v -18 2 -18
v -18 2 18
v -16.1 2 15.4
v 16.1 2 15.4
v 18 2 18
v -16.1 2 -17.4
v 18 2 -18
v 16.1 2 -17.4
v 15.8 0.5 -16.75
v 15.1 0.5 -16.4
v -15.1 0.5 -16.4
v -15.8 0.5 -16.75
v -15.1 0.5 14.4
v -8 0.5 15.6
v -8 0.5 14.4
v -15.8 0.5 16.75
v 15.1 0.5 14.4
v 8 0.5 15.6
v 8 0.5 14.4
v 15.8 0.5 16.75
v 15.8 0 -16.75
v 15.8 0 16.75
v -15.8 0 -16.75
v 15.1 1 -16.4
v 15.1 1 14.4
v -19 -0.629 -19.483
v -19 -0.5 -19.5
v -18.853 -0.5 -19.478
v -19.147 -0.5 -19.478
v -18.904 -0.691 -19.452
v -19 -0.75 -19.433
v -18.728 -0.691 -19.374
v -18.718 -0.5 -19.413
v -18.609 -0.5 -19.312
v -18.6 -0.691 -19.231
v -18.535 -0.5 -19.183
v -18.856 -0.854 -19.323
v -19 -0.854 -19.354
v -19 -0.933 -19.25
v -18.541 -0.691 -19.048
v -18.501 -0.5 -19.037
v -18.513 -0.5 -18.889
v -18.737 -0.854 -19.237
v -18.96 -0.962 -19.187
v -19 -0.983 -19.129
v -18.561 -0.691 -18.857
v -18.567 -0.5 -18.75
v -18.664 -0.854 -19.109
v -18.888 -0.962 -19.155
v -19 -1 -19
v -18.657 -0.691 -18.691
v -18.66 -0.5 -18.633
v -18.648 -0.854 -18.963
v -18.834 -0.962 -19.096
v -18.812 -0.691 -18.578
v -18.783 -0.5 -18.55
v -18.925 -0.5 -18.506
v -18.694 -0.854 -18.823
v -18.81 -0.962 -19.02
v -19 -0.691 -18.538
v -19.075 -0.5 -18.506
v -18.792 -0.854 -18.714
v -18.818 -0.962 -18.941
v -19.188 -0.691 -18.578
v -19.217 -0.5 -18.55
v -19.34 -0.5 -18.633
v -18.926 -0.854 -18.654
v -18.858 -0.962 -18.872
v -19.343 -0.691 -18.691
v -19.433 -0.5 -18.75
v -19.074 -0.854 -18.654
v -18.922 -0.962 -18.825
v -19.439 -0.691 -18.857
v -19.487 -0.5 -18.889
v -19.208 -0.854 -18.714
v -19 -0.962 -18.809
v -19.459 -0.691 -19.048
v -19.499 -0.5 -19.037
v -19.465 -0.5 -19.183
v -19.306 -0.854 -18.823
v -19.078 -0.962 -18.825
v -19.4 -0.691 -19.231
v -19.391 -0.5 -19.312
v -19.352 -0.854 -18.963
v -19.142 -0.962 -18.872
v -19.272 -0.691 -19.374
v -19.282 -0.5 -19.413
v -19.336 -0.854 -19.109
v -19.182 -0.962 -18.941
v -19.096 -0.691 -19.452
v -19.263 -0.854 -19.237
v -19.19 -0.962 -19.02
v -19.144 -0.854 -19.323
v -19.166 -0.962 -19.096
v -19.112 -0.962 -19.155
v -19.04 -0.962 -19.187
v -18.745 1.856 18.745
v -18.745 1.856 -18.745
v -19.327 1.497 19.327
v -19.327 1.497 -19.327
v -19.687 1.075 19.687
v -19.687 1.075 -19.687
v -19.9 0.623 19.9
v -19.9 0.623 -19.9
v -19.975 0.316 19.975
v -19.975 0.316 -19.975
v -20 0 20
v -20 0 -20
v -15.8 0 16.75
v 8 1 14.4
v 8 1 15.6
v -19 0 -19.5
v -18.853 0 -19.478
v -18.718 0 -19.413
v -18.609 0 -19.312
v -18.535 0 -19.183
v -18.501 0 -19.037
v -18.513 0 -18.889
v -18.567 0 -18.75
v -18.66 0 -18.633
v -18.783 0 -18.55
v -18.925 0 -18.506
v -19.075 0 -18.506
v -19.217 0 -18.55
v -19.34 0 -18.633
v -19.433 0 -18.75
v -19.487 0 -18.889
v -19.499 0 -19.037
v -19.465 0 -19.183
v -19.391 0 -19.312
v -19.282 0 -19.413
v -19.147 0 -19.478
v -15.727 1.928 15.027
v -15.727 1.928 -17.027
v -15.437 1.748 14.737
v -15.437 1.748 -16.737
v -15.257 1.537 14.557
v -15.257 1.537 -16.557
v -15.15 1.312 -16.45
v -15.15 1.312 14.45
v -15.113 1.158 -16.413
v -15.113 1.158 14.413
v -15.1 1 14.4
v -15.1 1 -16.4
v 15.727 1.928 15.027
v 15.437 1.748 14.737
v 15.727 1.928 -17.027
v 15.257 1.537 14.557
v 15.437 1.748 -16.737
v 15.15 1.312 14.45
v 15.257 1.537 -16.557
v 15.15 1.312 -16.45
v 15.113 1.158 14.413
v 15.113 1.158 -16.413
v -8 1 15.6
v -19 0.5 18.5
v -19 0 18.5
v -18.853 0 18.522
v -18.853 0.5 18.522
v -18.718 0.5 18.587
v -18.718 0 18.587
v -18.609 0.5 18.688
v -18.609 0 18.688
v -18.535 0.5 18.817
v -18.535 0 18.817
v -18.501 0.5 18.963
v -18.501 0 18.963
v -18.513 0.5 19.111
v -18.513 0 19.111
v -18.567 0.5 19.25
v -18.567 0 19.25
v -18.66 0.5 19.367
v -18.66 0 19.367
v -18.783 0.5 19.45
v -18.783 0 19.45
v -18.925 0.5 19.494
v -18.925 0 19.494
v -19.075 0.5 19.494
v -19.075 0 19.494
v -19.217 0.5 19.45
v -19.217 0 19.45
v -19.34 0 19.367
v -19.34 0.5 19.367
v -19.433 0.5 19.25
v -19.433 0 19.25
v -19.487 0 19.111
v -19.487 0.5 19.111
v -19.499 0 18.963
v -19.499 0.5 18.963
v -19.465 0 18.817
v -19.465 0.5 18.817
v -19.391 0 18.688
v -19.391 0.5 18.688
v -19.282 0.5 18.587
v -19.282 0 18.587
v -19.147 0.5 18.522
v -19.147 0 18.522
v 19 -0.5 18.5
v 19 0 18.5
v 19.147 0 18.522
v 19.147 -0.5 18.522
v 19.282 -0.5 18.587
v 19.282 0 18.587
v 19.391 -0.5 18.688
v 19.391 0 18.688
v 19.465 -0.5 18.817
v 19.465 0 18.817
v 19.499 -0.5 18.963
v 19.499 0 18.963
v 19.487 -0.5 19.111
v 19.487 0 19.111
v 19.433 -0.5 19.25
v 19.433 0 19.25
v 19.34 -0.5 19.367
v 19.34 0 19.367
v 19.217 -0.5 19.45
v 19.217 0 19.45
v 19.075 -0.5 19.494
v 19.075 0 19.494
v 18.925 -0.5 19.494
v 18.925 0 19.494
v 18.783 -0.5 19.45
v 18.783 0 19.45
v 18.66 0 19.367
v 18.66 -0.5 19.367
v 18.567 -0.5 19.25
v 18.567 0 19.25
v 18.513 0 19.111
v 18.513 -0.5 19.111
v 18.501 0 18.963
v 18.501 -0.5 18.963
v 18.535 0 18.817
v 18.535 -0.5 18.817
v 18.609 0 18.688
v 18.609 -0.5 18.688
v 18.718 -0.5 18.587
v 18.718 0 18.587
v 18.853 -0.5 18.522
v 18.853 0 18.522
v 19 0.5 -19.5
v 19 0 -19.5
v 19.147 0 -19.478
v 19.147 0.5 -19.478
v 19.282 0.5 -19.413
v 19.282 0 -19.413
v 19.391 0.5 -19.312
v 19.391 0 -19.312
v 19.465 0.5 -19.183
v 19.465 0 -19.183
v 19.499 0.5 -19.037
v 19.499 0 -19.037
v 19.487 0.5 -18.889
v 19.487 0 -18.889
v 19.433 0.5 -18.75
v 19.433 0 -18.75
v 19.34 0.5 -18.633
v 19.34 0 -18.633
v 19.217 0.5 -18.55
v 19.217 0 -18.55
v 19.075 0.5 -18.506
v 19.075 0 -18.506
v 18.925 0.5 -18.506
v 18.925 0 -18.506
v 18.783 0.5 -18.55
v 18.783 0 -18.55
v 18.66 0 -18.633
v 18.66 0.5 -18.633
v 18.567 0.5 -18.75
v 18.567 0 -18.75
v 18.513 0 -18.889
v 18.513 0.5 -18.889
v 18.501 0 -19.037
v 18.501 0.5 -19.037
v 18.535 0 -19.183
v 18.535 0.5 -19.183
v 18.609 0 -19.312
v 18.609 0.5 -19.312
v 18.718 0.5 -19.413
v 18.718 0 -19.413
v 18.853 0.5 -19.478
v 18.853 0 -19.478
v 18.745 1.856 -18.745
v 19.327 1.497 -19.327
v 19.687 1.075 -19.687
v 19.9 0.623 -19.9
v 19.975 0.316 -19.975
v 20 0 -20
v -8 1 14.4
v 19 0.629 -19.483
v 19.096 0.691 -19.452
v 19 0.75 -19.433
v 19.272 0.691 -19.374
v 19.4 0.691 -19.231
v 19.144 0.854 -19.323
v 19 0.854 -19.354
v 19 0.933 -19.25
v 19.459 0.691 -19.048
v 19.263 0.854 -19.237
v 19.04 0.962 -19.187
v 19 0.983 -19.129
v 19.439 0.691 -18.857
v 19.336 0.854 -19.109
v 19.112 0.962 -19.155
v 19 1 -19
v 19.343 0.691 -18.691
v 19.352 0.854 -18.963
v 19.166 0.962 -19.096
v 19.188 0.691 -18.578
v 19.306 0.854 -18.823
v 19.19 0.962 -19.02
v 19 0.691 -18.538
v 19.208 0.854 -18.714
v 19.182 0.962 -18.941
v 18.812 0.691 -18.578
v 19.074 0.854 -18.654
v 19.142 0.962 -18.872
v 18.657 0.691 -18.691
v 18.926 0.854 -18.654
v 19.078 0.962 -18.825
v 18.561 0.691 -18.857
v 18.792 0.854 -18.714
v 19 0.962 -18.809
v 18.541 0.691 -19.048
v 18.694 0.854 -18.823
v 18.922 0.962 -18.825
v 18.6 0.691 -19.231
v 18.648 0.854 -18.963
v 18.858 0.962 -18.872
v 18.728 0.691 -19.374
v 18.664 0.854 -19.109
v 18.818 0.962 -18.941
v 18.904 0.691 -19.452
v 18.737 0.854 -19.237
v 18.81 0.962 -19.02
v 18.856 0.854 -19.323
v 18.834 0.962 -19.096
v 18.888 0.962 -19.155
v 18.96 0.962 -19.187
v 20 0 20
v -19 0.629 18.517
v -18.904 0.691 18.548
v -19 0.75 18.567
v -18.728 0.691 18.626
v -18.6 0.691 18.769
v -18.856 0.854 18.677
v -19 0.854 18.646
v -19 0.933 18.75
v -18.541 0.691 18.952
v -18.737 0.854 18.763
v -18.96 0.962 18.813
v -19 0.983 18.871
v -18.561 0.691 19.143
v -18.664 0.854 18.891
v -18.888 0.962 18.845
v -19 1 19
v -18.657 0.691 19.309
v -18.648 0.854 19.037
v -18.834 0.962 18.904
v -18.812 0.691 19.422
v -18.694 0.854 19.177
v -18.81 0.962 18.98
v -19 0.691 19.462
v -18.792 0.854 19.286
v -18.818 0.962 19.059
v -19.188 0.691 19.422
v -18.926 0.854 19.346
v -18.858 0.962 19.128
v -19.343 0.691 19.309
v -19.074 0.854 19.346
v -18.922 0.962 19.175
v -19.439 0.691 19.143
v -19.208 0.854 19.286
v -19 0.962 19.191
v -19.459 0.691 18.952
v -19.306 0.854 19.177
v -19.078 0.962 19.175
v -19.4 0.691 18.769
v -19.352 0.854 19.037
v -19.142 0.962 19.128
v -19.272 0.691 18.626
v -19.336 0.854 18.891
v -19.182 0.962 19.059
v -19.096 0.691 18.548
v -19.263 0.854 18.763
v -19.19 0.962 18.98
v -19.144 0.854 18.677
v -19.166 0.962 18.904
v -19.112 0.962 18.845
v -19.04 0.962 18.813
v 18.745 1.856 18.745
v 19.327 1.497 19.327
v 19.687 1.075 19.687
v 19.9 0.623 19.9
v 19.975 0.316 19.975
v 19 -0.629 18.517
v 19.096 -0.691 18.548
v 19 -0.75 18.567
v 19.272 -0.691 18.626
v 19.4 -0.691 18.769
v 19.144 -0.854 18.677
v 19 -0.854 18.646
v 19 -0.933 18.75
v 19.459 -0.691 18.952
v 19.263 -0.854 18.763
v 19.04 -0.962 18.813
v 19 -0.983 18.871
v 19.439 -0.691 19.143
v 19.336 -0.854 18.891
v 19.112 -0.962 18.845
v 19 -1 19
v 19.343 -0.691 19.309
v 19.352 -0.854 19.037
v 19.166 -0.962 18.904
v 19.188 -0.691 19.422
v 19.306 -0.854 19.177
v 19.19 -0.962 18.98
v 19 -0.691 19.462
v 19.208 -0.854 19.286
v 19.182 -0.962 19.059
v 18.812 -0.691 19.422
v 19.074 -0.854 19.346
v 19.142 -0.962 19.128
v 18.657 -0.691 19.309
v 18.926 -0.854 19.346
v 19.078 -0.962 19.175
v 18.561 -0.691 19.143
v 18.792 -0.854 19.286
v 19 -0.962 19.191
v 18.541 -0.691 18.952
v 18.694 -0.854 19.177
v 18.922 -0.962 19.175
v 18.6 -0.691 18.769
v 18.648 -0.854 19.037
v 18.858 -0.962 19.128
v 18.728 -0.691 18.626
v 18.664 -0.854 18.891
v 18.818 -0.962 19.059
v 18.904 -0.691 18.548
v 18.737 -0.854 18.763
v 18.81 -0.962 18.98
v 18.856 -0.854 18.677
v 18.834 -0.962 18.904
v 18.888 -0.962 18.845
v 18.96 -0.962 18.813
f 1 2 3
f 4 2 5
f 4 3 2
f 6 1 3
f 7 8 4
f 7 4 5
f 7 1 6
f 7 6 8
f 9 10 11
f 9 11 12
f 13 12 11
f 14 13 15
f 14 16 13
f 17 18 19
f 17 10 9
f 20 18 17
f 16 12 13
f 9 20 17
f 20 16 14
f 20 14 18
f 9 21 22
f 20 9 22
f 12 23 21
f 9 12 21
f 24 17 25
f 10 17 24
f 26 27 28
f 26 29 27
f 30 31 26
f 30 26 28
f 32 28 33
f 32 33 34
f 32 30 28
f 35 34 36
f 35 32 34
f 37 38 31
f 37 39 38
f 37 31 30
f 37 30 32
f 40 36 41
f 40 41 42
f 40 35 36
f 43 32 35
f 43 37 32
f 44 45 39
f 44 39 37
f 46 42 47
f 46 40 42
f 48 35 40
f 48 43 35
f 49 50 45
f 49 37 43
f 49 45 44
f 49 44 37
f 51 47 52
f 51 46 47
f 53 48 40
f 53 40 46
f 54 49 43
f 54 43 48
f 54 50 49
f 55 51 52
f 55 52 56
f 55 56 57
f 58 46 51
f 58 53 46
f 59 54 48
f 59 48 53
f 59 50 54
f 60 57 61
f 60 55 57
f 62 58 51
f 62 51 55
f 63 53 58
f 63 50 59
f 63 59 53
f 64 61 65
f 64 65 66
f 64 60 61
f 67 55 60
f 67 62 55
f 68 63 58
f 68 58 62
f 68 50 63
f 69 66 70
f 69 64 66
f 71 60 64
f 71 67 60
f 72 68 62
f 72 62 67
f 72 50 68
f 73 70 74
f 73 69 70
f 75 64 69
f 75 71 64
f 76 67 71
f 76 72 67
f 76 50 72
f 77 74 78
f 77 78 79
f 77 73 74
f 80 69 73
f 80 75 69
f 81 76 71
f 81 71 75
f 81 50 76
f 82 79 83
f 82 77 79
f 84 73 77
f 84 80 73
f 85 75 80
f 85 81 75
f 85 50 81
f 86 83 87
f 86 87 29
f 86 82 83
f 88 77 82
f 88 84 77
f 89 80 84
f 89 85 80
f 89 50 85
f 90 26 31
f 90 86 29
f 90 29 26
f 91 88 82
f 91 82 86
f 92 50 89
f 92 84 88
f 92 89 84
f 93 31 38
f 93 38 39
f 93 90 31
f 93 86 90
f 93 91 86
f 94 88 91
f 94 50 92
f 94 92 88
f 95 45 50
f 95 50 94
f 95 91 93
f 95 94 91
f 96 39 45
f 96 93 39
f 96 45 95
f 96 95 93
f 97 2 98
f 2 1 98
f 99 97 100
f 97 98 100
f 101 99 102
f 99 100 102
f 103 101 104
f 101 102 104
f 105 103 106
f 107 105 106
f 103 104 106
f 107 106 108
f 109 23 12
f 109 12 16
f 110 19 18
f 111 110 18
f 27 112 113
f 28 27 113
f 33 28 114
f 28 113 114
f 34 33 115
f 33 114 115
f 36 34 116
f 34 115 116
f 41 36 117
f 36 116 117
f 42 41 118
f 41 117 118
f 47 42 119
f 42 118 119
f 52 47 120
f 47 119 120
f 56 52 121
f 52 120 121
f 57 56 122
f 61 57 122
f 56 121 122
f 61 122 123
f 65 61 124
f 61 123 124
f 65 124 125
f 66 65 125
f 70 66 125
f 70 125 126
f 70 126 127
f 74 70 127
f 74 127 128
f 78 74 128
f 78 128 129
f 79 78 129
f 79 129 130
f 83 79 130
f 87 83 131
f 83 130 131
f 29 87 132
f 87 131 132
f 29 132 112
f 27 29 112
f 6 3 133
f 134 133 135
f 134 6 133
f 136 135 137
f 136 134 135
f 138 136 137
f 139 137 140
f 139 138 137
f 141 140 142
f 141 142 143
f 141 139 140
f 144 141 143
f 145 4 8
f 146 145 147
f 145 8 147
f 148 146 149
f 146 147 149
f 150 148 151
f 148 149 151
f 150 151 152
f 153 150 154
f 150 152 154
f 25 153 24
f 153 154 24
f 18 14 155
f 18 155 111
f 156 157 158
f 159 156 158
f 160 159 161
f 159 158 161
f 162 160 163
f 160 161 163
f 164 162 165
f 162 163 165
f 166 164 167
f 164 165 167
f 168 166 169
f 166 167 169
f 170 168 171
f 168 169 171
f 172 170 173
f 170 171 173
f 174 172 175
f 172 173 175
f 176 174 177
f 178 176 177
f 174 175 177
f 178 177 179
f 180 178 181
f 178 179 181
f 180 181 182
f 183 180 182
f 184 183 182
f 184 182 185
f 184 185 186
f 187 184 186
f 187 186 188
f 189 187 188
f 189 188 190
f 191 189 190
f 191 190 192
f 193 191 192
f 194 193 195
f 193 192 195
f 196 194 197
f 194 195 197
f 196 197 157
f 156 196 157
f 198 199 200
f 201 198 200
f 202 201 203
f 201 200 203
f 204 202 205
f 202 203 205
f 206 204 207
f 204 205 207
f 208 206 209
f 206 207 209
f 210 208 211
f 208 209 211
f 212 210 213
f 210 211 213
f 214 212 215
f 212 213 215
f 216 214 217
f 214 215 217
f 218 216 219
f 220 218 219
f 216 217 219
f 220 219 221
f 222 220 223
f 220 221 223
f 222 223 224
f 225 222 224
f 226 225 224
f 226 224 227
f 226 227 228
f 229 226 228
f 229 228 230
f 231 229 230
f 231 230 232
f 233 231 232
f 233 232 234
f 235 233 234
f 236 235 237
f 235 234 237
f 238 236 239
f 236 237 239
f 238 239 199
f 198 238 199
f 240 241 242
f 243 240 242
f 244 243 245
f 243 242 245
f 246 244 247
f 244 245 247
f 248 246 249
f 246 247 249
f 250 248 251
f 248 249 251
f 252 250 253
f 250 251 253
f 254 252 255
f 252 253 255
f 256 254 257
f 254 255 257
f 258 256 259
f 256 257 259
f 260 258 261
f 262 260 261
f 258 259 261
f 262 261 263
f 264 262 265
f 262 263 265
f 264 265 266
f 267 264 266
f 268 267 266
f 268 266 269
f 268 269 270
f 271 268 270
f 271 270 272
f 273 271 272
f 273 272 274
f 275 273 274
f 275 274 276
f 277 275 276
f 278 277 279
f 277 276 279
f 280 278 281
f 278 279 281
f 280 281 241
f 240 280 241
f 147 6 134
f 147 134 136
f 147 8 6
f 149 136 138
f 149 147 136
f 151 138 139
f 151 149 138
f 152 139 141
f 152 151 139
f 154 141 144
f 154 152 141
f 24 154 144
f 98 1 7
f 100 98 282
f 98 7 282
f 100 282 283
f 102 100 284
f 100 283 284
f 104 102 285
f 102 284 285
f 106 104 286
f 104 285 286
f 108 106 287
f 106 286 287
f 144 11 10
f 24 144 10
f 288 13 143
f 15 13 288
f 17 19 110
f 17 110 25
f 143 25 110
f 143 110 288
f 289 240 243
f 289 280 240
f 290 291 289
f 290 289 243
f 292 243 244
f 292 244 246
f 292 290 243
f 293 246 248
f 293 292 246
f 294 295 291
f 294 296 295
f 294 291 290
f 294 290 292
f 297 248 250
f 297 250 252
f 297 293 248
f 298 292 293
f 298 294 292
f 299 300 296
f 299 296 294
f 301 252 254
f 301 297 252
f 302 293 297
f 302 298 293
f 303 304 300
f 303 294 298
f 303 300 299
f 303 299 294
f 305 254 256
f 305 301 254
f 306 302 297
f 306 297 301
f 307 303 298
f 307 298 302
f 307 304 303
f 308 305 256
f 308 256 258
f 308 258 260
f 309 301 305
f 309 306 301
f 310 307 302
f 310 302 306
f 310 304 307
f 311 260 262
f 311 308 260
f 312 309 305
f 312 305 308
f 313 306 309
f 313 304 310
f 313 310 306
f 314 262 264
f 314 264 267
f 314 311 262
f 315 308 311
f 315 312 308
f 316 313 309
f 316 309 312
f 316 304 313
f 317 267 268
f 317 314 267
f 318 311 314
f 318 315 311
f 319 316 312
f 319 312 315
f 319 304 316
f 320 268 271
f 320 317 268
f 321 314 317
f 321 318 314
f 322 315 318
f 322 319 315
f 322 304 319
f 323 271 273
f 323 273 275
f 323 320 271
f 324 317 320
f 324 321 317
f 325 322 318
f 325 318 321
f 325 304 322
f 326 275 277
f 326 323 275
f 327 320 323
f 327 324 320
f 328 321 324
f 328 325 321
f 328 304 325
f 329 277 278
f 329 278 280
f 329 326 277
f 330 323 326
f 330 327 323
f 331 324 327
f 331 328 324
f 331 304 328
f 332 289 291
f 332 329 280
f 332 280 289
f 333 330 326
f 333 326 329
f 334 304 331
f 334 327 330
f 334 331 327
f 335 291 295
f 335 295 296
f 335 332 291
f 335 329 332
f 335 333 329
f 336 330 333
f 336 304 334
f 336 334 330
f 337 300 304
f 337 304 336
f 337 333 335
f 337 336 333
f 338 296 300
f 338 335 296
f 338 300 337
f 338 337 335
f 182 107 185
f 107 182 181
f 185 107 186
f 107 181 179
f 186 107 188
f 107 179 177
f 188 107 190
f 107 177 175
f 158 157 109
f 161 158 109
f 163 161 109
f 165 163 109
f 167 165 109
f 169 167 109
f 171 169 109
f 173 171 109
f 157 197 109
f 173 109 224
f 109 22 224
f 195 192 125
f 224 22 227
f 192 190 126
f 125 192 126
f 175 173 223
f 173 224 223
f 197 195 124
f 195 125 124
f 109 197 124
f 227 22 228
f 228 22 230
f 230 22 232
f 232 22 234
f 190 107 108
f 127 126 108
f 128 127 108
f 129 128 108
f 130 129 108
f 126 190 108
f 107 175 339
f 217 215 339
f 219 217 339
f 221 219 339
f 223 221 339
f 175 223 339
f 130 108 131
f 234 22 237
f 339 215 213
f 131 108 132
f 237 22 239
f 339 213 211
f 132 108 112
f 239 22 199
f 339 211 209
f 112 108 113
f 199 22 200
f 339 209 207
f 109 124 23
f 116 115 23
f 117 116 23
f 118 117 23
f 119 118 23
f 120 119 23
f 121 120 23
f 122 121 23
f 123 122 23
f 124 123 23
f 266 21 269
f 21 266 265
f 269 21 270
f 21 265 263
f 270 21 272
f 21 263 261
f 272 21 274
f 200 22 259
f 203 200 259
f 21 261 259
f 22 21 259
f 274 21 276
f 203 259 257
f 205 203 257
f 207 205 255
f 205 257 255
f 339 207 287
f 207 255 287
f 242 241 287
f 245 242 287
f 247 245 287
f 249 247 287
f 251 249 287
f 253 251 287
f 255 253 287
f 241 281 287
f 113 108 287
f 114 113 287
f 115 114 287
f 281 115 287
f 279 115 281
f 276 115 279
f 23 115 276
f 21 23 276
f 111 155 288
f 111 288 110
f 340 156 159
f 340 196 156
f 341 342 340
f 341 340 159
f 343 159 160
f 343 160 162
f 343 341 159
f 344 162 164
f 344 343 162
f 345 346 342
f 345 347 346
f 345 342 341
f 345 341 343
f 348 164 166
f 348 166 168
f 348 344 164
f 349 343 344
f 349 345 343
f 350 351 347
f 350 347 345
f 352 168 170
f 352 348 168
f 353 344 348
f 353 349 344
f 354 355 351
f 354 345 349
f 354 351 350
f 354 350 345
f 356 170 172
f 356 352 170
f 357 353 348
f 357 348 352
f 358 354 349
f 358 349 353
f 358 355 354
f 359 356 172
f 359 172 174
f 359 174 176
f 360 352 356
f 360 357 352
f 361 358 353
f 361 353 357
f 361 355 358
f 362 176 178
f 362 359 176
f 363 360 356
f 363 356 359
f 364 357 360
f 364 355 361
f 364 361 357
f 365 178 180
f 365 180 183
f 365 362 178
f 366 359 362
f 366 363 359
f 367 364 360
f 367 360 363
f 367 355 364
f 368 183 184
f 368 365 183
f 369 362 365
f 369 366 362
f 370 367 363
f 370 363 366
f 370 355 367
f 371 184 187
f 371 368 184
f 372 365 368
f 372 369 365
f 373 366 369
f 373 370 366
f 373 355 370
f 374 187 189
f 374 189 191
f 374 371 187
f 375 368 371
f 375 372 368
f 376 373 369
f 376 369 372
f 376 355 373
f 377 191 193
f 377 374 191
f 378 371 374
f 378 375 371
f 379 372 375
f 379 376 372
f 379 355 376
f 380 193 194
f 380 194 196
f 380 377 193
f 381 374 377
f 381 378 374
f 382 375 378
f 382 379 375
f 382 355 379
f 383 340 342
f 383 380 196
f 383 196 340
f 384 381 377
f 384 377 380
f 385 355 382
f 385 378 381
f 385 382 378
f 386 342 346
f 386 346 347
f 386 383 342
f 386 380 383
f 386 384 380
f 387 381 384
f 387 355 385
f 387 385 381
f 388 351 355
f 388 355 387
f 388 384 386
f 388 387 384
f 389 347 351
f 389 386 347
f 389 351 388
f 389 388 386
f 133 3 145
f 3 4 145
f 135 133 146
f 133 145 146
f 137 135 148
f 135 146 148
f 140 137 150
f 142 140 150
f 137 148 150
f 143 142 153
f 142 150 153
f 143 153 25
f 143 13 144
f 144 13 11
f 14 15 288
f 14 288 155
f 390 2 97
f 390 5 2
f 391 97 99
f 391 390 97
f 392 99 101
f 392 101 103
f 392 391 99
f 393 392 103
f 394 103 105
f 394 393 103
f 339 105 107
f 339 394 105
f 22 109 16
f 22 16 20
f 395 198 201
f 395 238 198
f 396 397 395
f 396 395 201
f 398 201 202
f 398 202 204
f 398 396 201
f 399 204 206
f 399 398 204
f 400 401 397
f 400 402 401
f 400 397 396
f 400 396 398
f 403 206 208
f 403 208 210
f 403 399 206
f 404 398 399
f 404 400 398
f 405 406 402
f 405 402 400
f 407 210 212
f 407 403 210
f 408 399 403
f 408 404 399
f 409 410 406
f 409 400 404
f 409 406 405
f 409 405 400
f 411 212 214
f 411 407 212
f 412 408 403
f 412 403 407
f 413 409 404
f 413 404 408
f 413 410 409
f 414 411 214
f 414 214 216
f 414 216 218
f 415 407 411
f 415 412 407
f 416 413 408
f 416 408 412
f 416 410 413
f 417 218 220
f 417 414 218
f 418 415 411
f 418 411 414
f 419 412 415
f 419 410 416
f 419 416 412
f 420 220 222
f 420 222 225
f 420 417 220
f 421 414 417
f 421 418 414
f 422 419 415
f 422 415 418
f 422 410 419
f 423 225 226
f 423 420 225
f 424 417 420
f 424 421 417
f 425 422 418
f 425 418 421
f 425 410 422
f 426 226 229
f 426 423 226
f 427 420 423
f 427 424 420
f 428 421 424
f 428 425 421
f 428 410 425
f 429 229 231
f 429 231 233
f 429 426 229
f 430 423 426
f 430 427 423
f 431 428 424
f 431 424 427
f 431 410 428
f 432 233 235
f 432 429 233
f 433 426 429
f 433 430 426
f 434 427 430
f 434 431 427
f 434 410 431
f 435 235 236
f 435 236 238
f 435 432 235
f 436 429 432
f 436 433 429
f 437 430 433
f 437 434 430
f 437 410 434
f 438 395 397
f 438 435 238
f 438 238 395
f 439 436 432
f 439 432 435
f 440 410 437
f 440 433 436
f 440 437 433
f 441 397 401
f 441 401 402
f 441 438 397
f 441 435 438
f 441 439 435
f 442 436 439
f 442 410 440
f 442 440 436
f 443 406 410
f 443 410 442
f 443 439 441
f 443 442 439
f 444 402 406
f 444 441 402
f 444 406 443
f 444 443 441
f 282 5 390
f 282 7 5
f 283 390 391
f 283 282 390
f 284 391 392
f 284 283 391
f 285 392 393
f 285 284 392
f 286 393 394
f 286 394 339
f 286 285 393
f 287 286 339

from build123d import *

# Parameters (mm, degrees)
SKETCH_1_W          = 40
SKETCH_1_H          = 40
SKETCH_1_W_2        = 30.2
SKETCH_1_H_2        = 30.8
EXTRUDE_1_DEPTH     = 2
SKETCH_2_W          = 31.6
SKETCH_2_H          = 33.5
CUT_EXTRUDE_1_DEPTH = 0.5
SKETCH_3_W          = 16
SKETCH_3_H          = 1.2
CUT_EXTRUDE_2_DEPTH = 0.5
FILLET_1_R          = 1
FILLET_2_R          = 2
SKETCH_4_R          = 0.5
EXTRUDE_2_DEPTH     = 1
FILLET_4_R          = 0.5
SKETCH_5_R          = 0.5
CUT_EXTRUDE_3_DEPTH = 1
FILLET_5_R          = 0.5
FILLET_6_R          = 0.5


with BuildPart() as part:
    # 草图1 → 凸台-拉伸1 (new body)
    with BuildSketch(Plane(origin=(0, 0, 0), x_dir=(1, 0, 0), z_dir=(0, 1, 0))):
        Rectangle(SKETCH_1_W, SKETCH_1_H)
        with Locations((0, 1)):
            Rectangle(SKETCH_1_W_2, SKETCH_1_H_2, mode=Mode.SUBTRACT)
    extrude(amount=EXTRUDE_1_DEPTH)

    # 草图2 → 切除-拉伸1 (cut)
    with BuildSketch(Plane.XZ):
        Rectangle(SKETCH_2_W, SKETCH_2_H)
    extrude(amount=-CUT_EXTRUDE_1_DEPTH, mode=Mode.SUBTRACT)

    # 草图3 → 切除-拉伸2 (cut)
    with BuildSketch(Plane.XZ.offset(-0.5)):
        with Locations((0, 15)):
            Rectangle(SKETCH_3_W, SKETCH_3_H)
    extrude(amount=-CUT_EXTRUDE_2_DEPTH, mode=Mode.SUBTRACT)

    # 圆角1
    fillet_1_edges = [part.edges().sort_by_distance(p)[0] for p in [
        (15.1, 2, -1),
        (0, 2, -16.4),
        (-15.1, 2, -1),
        (0, 2, 14.4),
    ]]
    fillet(fillet_1_edges, radius=FILLET_1_R - 0.0001)  # a hair under: the kernel refuses the full size

    # 圆角2
    fillet_2_edges = [part.edges().sort_by_distance(p)[0] for p in [
        (0, 2, -20),
        (20, 2, 0),
        (0, 2, 20),
        (-20, 2, 0),
    ]]
    fillet(fillet_2_edges, radius=FILLET_2_R - 0.0001)  # a hair under: the kernel refuses the full size

    # 草图4 → 凸台-拉伸2 (add)
    with BuildSketch(Plane.XZ):
        with Locations(Location((-19, -19, 0), (0, 0, 270))):
            Circle(SKETCH_4_R)
        with Locations(Location((19, 19, 0), (0, 0, 270))):
            Circle(SKETCH_4_R)
    extrude(amount=EXTRUDE_2_DEPTH)

    # 圆角4
    fillet_4_edges = [part.edges().sort_by_distance(p)[0] for p in [
        (19, -1, 19.5),
    ]]
    fillet(fillet_4_edges, radius=FILLET_4_R)

    # 草图5 → 切除-拉伸3 (cut)
    with BuildSketch(Plane.XZ):
        with Locations(Location((19, -19, 0), (0, 0, 270))):
            Circle(SKETCH_5_R)
        with Locations(Location((-19, 19, 0), (0, 0, 270))):
            Circle(SKETCH_5_R)
    extrude(amount=-CUT_EXTRUDE_3_DEPTH, mode=Mode.SUBTRACT)

    # 圆角5
    fillet_5_edges = [part.edges().sort_by_distance(p)[0] for p in [
        (19, 1, -18.5),
        (-19, 1, 19.5),
    ]]
    fillet(fillet_5_edges, radius=FILLET_5_R)

    # 圆角6
    fillet_6_edges = [part.edges().sort_by_distance(p)[0] for p in [
        (-19, -1, -18.5),
    ]]
    fillet(fillet_6_edges, radius=FILLET_6_R)


solid = part.part
